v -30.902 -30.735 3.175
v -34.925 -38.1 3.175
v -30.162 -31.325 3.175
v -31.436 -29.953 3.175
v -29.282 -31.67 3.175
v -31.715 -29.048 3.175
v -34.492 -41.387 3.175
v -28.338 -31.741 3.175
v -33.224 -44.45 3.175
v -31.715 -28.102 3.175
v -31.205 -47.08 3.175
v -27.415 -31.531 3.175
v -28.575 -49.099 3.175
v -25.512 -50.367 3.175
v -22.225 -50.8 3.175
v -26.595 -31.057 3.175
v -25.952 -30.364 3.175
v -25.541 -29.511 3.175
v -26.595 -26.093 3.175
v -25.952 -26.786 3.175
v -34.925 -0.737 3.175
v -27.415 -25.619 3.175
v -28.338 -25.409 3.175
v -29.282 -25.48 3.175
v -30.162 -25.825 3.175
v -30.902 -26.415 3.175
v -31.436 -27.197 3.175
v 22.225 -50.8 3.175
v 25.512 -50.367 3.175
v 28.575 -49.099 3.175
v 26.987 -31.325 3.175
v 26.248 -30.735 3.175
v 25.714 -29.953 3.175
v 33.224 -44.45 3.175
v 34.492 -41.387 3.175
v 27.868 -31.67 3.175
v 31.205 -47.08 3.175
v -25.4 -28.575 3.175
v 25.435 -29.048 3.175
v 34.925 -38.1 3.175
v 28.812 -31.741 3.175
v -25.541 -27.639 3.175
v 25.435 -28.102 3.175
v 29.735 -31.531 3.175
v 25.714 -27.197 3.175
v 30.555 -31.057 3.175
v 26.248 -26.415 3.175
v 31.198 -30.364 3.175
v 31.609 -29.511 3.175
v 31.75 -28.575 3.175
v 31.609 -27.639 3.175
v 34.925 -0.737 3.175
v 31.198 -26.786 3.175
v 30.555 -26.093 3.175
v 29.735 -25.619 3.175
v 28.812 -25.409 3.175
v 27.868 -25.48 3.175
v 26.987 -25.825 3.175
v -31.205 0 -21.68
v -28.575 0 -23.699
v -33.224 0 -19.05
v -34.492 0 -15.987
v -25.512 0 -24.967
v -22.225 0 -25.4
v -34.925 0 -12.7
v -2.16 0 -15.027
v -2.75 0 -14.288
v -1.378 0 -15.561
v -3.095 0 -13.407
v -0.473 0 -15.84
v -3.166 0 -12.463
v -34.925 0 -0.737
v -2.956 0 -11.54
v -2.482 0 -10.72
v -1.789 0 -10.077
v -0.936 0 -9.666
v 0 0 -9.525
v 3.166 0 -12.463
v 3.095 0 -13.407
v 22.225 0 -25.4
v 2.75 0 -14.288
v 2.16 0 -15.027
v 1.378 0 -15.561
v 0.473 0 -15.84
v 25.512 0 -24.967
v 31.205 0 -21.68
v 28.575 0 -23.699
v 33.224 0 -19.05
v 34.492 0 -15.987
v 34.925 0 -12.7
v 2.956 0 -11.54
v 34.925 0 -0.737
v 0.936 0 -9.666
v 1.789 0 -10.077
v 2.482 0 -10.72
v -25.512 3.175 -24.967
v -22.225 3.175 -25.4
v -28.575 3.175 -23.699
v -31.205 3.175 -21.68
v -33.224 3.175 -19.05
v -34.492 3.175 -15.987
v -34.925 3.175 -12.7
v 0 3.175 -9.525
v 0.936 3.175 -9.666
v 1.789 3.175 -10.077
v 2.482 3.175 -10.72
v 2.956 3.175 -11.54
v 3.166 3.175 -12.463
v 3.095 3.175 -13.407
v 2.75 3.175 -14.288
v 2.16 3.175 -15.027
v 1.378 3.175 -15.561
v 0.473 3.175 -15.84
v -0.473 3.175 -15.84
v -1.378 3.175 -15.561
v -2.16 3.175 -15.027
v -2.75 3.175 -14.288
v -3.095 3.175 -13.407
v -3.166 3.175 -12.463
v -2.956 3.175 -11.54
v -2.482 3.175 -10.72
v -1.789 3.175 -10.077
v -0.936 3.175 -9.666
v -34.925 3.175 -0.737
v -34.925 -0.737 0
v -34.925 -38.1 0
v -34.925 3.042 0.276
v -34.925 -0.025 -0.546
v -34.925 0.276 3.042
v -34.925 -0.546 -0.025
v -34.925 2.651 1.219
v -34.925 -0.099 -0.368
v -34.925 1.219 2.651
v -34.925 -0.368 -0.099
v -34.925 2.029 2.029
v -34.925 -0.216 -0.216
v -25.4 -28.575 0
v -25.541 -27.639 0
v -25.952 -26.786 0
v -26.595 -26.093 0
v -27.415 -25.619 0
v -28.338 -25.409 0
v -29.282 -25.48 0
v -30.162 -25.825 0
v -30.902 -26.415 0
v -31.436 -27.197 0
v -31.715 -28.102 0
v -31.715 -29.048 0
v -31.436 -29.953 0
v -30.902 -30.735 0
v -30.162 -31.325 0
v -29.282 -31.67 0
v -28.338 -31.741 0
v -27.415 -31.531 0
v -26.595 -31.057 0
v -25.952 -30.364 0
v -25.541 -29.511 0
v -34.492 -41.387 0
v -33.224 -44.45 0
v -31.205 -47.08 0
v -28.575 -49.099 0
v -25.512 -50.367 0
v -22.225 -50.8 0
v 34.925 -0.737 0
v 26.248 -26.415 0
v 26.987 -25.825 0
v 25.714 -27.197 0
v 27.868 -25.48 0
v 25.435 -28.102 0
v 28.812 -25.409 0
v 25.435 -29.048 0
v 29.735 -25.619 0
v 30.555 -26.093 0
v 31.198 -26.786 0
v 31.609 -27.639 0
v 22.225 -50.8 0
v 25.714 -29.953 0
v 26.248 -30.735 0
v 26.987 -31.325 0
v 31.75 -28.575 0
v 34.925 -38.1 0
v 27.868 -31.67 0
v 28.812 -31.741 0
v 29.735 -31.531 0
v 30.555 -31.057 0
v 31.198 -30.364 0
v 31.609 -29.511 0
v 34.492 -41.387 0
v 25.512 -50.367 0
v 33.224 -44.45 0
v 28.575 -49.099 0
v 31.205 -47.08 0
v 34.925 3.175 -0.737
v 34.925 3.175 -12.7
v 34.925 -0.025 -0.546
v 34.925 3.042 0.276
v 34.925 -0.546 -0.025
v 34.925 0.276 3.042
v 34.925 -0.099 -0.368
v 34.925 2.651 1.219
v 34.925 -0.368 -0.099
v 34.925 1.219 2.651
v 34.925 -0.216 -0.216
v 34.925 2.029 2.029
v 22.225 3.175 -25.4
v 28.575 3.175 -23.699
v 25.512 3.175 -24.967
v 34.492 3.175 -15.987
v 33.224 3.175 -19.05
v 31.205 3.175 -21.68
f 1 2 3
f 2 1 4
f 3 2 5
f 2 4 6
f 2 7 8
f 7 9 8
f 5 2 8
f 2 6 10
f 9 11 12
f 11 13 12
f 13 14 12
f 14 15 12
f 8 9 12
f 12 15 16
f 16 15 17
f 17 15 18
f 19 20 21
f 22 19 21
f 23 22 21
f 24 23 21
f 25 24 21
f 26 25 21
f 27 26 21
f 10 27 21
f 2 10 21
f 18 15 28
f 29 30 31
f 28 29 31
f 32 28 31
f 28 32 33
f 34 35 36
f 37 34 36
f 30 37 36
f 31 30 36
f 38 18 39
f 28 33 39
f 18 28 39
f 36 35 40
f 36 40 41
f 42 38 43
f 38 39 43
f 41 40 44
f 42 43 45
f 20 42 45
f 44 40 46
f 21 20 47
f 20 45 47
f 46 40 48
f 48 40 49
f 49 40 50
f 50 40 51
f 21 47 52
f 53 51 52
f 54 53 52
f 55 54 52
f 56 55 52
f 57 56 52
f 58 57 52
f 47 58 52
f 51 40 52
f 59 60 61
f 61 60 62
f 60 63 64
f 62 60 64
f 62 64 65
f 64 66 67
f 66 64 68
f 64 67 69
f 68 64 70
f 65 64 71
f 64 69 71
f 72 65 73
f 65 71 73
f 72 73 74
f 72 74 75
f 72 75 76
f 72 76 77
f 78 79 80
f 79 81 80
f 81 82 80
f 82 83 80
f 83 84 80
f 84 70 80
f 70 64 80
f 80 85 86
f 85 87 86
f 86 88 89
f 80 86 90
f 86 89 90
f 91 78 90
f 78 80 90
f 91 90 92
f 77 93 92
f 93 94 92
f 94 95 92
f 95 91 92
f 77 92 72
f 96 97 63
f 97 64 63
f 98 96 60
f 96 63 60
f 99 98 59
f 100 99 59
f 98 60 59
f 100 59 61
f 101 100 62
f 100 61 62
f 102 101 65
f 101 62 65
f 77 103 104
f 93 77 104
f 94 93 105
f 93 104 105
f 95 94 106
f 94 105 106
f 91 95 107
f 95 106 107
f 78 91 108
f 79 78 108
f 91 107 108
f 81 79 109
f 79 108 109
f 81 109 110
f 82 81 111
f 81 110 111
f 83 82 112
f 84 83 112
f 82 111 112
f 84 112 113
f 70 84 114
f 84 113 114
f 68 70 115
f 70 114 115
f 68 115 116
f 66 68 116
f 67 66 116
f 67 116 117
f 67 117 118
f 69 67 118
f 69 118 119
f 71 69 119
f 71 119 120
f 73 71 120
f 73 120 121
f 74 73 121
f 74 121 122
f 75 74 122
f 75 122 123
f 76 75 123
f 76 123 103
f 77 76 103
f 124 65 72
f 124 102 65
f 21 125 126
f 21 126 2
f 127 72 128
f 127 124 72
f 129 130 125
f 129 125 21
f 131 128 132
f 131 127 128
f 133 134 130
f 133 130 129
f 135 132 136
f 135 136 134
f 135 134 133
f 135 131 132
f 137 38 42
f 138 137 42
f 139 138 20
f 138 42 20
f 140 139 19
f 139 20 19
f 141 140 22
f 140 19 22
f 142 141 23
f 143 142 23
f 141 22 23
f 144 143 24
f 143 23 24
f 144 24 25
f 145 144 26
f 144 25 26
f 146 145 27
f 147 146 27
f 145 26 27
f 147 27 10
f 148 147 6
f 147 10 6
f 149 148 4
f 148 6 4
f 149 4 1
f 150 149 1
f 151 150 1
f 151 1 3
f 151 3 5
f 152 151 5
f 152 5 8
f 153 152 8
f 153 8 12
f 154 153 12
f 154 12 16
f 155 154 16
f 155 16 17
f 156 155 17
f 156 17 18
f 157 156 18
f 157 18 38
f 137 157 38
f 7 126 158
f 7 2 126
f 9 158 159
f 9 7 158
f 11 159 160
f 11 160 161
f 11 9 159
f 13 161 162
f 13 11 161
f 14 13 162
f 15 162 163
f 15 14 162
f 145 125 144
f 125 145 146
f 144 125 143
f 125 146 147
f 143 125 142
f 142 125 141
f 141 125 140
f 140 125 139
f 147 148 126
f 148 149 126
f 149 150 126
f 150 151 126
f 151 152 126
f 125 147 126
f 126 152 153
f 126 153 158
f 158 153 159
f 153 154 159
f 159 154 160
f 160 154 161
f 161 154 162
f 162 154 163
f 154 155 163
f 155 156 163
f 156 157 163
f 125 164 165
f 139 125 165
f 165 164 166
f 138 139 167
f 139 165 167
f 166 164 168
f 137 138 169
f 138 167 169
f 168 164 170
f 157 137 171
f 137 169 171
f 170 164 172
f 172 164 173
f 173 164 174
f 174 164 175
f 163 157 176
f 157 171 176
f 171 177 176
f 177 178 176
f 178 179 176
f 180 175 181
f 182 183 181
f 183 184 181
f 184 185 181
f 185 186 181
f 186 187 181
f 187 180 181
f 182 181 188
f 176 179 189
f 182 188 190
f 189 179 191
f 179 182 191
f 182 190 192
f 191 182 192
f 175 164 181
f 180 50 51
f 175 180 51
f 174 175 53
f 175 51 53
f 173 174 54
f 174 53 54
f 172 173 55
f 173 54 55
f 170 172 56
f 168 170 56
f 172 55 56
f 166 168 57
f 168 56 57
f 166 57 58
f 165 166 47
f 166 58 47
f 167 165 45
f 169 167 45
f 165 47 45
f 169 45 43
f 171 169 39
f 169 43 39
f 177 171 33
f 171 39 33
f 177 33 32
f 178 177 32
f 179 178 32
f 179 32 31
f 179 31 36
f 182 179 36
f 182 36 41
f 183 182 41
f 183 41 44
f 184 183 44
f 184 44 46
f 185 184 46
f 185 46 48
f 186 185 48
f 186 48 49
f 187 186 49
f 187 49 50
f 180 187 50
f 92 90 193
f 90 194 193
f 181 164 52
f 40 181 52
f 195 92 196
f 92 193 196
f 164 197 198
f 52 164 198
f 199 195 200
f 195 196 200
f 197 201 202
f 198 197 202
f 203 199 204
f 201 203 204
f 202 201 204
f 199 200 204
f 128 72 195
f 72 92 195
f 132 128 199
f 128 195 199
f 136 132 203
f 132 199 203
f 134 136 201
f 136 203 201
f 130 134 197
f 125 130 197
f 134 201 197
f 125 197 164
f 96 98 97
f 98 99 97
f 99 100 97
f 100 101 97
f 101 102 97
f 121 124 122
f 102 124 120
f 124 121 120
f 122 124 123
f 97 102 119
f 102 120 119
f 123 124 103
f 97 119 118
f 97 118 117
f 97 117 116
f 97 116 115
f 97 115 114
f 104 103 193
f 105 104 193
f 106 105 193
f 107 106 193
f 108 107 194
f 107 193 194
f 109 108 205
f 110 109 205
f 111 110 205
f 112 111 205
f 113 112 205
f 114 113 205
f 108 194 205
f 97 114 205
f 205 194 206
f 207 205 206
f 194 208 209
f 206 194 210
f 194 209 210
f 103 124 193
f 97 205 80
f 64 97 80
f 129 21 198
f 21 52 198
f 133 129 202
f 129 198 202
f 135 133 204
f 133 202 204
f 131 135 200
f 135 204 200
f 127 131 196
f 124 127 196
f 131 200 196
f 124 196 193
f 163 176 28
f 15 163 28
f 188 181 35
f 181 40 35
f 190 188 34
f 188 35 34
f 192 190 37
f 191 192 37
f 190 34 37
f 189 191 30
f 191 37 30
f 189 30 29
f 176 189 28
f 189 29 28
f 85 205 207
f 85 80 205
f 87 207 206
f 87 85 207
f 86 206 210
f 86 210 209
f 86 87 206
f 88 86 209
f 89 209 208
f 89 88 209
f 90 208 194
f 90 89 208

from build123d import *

# Parameters (mm, degrees)
BASE_FLANGE1_DEPTH = 34.925
SKETCH6_R          = 3.175
CUT_EXTRUDE1_DEPTH = 68.947967225
FILLET1_R          = 12.7
SKETCH7_R          = 3.175
CUT_EXTRUDE2_DEPTH = 70.124642856


# Sheet-metal steps are written as plain solids
with BuildPart() as part:
    # Sketch1 → Base-Flange1 (new, symmetric)
    with BuildSketch(Plane(origin=(0, 0, 0), x_dir=(0, 0, -1), z_dir=(1, 0, 0))):
        with BuildLine():
            Line((25.4, 0), (0.7366, 0))
            ThreePointArc((0.7366, 0), (0.215745145, -0.215745145), (0, -0.7366))
            Line((0, -0.7366), (0, -50.8))
            Line((0, -50.8), (-3.175, -50.8))
            Line((-3.175, -50.8), (-3.175, -0.7366))
            ThreePointArc((-3.175, -0.7366), (-2.029318885, 2.029318885), (0.7366, 3.175))
            Line((0.7366, 3.175), (25.4, 3.175))
            Line((25.4, 3.175), (25.4, 0))
        make_face()
    extrude(amount=BASE_FLANGE1_DEPTH, both=True)

    # Sketch6 → Cut-Extrude1 (cut, through all)
    with BuildSketch(Plane.XY.offset(3.175)):
        with Locations((-28.575, -28.575)):
            Circle(SKETCH6_R)
        with Locations((28.575, -28.575)):
            Circle(SKETCH6_R)
    extrude(amount=-CUT_EXTRUDE1_DEPTH, mode=Mode.SUBTRACT)

    # Fillet1
    fillet1_edges = [part.edges().sort_by_distance(p)[0] for p in [
        (34.925, 1.5875, -25.4),
        (34.925, -50.8, 1.5875),
        (-34.925, 1.5875, -25.4),
        (-34.925, -50.8, 1.5875),
    ]]
    fillet(fillet1_edges, radius=FILLET1_R)

    # Sketch7 → Cut-Extrude2 (cut, through all)
    with BuildSketch(Plane(origin=(0, 3.175, 0), x_dir=(1, 0, 0), z_dir=(0, 1, 0))):
        with Locations(Location((0, 12.7, 0), (0, 0, 270))):
            Circle(SKETCH7_R)
    extrude(amount=-CUT_EXTRUDE2_DEPTH, mode=Mode.SUBTRACT)


solid = part.part
